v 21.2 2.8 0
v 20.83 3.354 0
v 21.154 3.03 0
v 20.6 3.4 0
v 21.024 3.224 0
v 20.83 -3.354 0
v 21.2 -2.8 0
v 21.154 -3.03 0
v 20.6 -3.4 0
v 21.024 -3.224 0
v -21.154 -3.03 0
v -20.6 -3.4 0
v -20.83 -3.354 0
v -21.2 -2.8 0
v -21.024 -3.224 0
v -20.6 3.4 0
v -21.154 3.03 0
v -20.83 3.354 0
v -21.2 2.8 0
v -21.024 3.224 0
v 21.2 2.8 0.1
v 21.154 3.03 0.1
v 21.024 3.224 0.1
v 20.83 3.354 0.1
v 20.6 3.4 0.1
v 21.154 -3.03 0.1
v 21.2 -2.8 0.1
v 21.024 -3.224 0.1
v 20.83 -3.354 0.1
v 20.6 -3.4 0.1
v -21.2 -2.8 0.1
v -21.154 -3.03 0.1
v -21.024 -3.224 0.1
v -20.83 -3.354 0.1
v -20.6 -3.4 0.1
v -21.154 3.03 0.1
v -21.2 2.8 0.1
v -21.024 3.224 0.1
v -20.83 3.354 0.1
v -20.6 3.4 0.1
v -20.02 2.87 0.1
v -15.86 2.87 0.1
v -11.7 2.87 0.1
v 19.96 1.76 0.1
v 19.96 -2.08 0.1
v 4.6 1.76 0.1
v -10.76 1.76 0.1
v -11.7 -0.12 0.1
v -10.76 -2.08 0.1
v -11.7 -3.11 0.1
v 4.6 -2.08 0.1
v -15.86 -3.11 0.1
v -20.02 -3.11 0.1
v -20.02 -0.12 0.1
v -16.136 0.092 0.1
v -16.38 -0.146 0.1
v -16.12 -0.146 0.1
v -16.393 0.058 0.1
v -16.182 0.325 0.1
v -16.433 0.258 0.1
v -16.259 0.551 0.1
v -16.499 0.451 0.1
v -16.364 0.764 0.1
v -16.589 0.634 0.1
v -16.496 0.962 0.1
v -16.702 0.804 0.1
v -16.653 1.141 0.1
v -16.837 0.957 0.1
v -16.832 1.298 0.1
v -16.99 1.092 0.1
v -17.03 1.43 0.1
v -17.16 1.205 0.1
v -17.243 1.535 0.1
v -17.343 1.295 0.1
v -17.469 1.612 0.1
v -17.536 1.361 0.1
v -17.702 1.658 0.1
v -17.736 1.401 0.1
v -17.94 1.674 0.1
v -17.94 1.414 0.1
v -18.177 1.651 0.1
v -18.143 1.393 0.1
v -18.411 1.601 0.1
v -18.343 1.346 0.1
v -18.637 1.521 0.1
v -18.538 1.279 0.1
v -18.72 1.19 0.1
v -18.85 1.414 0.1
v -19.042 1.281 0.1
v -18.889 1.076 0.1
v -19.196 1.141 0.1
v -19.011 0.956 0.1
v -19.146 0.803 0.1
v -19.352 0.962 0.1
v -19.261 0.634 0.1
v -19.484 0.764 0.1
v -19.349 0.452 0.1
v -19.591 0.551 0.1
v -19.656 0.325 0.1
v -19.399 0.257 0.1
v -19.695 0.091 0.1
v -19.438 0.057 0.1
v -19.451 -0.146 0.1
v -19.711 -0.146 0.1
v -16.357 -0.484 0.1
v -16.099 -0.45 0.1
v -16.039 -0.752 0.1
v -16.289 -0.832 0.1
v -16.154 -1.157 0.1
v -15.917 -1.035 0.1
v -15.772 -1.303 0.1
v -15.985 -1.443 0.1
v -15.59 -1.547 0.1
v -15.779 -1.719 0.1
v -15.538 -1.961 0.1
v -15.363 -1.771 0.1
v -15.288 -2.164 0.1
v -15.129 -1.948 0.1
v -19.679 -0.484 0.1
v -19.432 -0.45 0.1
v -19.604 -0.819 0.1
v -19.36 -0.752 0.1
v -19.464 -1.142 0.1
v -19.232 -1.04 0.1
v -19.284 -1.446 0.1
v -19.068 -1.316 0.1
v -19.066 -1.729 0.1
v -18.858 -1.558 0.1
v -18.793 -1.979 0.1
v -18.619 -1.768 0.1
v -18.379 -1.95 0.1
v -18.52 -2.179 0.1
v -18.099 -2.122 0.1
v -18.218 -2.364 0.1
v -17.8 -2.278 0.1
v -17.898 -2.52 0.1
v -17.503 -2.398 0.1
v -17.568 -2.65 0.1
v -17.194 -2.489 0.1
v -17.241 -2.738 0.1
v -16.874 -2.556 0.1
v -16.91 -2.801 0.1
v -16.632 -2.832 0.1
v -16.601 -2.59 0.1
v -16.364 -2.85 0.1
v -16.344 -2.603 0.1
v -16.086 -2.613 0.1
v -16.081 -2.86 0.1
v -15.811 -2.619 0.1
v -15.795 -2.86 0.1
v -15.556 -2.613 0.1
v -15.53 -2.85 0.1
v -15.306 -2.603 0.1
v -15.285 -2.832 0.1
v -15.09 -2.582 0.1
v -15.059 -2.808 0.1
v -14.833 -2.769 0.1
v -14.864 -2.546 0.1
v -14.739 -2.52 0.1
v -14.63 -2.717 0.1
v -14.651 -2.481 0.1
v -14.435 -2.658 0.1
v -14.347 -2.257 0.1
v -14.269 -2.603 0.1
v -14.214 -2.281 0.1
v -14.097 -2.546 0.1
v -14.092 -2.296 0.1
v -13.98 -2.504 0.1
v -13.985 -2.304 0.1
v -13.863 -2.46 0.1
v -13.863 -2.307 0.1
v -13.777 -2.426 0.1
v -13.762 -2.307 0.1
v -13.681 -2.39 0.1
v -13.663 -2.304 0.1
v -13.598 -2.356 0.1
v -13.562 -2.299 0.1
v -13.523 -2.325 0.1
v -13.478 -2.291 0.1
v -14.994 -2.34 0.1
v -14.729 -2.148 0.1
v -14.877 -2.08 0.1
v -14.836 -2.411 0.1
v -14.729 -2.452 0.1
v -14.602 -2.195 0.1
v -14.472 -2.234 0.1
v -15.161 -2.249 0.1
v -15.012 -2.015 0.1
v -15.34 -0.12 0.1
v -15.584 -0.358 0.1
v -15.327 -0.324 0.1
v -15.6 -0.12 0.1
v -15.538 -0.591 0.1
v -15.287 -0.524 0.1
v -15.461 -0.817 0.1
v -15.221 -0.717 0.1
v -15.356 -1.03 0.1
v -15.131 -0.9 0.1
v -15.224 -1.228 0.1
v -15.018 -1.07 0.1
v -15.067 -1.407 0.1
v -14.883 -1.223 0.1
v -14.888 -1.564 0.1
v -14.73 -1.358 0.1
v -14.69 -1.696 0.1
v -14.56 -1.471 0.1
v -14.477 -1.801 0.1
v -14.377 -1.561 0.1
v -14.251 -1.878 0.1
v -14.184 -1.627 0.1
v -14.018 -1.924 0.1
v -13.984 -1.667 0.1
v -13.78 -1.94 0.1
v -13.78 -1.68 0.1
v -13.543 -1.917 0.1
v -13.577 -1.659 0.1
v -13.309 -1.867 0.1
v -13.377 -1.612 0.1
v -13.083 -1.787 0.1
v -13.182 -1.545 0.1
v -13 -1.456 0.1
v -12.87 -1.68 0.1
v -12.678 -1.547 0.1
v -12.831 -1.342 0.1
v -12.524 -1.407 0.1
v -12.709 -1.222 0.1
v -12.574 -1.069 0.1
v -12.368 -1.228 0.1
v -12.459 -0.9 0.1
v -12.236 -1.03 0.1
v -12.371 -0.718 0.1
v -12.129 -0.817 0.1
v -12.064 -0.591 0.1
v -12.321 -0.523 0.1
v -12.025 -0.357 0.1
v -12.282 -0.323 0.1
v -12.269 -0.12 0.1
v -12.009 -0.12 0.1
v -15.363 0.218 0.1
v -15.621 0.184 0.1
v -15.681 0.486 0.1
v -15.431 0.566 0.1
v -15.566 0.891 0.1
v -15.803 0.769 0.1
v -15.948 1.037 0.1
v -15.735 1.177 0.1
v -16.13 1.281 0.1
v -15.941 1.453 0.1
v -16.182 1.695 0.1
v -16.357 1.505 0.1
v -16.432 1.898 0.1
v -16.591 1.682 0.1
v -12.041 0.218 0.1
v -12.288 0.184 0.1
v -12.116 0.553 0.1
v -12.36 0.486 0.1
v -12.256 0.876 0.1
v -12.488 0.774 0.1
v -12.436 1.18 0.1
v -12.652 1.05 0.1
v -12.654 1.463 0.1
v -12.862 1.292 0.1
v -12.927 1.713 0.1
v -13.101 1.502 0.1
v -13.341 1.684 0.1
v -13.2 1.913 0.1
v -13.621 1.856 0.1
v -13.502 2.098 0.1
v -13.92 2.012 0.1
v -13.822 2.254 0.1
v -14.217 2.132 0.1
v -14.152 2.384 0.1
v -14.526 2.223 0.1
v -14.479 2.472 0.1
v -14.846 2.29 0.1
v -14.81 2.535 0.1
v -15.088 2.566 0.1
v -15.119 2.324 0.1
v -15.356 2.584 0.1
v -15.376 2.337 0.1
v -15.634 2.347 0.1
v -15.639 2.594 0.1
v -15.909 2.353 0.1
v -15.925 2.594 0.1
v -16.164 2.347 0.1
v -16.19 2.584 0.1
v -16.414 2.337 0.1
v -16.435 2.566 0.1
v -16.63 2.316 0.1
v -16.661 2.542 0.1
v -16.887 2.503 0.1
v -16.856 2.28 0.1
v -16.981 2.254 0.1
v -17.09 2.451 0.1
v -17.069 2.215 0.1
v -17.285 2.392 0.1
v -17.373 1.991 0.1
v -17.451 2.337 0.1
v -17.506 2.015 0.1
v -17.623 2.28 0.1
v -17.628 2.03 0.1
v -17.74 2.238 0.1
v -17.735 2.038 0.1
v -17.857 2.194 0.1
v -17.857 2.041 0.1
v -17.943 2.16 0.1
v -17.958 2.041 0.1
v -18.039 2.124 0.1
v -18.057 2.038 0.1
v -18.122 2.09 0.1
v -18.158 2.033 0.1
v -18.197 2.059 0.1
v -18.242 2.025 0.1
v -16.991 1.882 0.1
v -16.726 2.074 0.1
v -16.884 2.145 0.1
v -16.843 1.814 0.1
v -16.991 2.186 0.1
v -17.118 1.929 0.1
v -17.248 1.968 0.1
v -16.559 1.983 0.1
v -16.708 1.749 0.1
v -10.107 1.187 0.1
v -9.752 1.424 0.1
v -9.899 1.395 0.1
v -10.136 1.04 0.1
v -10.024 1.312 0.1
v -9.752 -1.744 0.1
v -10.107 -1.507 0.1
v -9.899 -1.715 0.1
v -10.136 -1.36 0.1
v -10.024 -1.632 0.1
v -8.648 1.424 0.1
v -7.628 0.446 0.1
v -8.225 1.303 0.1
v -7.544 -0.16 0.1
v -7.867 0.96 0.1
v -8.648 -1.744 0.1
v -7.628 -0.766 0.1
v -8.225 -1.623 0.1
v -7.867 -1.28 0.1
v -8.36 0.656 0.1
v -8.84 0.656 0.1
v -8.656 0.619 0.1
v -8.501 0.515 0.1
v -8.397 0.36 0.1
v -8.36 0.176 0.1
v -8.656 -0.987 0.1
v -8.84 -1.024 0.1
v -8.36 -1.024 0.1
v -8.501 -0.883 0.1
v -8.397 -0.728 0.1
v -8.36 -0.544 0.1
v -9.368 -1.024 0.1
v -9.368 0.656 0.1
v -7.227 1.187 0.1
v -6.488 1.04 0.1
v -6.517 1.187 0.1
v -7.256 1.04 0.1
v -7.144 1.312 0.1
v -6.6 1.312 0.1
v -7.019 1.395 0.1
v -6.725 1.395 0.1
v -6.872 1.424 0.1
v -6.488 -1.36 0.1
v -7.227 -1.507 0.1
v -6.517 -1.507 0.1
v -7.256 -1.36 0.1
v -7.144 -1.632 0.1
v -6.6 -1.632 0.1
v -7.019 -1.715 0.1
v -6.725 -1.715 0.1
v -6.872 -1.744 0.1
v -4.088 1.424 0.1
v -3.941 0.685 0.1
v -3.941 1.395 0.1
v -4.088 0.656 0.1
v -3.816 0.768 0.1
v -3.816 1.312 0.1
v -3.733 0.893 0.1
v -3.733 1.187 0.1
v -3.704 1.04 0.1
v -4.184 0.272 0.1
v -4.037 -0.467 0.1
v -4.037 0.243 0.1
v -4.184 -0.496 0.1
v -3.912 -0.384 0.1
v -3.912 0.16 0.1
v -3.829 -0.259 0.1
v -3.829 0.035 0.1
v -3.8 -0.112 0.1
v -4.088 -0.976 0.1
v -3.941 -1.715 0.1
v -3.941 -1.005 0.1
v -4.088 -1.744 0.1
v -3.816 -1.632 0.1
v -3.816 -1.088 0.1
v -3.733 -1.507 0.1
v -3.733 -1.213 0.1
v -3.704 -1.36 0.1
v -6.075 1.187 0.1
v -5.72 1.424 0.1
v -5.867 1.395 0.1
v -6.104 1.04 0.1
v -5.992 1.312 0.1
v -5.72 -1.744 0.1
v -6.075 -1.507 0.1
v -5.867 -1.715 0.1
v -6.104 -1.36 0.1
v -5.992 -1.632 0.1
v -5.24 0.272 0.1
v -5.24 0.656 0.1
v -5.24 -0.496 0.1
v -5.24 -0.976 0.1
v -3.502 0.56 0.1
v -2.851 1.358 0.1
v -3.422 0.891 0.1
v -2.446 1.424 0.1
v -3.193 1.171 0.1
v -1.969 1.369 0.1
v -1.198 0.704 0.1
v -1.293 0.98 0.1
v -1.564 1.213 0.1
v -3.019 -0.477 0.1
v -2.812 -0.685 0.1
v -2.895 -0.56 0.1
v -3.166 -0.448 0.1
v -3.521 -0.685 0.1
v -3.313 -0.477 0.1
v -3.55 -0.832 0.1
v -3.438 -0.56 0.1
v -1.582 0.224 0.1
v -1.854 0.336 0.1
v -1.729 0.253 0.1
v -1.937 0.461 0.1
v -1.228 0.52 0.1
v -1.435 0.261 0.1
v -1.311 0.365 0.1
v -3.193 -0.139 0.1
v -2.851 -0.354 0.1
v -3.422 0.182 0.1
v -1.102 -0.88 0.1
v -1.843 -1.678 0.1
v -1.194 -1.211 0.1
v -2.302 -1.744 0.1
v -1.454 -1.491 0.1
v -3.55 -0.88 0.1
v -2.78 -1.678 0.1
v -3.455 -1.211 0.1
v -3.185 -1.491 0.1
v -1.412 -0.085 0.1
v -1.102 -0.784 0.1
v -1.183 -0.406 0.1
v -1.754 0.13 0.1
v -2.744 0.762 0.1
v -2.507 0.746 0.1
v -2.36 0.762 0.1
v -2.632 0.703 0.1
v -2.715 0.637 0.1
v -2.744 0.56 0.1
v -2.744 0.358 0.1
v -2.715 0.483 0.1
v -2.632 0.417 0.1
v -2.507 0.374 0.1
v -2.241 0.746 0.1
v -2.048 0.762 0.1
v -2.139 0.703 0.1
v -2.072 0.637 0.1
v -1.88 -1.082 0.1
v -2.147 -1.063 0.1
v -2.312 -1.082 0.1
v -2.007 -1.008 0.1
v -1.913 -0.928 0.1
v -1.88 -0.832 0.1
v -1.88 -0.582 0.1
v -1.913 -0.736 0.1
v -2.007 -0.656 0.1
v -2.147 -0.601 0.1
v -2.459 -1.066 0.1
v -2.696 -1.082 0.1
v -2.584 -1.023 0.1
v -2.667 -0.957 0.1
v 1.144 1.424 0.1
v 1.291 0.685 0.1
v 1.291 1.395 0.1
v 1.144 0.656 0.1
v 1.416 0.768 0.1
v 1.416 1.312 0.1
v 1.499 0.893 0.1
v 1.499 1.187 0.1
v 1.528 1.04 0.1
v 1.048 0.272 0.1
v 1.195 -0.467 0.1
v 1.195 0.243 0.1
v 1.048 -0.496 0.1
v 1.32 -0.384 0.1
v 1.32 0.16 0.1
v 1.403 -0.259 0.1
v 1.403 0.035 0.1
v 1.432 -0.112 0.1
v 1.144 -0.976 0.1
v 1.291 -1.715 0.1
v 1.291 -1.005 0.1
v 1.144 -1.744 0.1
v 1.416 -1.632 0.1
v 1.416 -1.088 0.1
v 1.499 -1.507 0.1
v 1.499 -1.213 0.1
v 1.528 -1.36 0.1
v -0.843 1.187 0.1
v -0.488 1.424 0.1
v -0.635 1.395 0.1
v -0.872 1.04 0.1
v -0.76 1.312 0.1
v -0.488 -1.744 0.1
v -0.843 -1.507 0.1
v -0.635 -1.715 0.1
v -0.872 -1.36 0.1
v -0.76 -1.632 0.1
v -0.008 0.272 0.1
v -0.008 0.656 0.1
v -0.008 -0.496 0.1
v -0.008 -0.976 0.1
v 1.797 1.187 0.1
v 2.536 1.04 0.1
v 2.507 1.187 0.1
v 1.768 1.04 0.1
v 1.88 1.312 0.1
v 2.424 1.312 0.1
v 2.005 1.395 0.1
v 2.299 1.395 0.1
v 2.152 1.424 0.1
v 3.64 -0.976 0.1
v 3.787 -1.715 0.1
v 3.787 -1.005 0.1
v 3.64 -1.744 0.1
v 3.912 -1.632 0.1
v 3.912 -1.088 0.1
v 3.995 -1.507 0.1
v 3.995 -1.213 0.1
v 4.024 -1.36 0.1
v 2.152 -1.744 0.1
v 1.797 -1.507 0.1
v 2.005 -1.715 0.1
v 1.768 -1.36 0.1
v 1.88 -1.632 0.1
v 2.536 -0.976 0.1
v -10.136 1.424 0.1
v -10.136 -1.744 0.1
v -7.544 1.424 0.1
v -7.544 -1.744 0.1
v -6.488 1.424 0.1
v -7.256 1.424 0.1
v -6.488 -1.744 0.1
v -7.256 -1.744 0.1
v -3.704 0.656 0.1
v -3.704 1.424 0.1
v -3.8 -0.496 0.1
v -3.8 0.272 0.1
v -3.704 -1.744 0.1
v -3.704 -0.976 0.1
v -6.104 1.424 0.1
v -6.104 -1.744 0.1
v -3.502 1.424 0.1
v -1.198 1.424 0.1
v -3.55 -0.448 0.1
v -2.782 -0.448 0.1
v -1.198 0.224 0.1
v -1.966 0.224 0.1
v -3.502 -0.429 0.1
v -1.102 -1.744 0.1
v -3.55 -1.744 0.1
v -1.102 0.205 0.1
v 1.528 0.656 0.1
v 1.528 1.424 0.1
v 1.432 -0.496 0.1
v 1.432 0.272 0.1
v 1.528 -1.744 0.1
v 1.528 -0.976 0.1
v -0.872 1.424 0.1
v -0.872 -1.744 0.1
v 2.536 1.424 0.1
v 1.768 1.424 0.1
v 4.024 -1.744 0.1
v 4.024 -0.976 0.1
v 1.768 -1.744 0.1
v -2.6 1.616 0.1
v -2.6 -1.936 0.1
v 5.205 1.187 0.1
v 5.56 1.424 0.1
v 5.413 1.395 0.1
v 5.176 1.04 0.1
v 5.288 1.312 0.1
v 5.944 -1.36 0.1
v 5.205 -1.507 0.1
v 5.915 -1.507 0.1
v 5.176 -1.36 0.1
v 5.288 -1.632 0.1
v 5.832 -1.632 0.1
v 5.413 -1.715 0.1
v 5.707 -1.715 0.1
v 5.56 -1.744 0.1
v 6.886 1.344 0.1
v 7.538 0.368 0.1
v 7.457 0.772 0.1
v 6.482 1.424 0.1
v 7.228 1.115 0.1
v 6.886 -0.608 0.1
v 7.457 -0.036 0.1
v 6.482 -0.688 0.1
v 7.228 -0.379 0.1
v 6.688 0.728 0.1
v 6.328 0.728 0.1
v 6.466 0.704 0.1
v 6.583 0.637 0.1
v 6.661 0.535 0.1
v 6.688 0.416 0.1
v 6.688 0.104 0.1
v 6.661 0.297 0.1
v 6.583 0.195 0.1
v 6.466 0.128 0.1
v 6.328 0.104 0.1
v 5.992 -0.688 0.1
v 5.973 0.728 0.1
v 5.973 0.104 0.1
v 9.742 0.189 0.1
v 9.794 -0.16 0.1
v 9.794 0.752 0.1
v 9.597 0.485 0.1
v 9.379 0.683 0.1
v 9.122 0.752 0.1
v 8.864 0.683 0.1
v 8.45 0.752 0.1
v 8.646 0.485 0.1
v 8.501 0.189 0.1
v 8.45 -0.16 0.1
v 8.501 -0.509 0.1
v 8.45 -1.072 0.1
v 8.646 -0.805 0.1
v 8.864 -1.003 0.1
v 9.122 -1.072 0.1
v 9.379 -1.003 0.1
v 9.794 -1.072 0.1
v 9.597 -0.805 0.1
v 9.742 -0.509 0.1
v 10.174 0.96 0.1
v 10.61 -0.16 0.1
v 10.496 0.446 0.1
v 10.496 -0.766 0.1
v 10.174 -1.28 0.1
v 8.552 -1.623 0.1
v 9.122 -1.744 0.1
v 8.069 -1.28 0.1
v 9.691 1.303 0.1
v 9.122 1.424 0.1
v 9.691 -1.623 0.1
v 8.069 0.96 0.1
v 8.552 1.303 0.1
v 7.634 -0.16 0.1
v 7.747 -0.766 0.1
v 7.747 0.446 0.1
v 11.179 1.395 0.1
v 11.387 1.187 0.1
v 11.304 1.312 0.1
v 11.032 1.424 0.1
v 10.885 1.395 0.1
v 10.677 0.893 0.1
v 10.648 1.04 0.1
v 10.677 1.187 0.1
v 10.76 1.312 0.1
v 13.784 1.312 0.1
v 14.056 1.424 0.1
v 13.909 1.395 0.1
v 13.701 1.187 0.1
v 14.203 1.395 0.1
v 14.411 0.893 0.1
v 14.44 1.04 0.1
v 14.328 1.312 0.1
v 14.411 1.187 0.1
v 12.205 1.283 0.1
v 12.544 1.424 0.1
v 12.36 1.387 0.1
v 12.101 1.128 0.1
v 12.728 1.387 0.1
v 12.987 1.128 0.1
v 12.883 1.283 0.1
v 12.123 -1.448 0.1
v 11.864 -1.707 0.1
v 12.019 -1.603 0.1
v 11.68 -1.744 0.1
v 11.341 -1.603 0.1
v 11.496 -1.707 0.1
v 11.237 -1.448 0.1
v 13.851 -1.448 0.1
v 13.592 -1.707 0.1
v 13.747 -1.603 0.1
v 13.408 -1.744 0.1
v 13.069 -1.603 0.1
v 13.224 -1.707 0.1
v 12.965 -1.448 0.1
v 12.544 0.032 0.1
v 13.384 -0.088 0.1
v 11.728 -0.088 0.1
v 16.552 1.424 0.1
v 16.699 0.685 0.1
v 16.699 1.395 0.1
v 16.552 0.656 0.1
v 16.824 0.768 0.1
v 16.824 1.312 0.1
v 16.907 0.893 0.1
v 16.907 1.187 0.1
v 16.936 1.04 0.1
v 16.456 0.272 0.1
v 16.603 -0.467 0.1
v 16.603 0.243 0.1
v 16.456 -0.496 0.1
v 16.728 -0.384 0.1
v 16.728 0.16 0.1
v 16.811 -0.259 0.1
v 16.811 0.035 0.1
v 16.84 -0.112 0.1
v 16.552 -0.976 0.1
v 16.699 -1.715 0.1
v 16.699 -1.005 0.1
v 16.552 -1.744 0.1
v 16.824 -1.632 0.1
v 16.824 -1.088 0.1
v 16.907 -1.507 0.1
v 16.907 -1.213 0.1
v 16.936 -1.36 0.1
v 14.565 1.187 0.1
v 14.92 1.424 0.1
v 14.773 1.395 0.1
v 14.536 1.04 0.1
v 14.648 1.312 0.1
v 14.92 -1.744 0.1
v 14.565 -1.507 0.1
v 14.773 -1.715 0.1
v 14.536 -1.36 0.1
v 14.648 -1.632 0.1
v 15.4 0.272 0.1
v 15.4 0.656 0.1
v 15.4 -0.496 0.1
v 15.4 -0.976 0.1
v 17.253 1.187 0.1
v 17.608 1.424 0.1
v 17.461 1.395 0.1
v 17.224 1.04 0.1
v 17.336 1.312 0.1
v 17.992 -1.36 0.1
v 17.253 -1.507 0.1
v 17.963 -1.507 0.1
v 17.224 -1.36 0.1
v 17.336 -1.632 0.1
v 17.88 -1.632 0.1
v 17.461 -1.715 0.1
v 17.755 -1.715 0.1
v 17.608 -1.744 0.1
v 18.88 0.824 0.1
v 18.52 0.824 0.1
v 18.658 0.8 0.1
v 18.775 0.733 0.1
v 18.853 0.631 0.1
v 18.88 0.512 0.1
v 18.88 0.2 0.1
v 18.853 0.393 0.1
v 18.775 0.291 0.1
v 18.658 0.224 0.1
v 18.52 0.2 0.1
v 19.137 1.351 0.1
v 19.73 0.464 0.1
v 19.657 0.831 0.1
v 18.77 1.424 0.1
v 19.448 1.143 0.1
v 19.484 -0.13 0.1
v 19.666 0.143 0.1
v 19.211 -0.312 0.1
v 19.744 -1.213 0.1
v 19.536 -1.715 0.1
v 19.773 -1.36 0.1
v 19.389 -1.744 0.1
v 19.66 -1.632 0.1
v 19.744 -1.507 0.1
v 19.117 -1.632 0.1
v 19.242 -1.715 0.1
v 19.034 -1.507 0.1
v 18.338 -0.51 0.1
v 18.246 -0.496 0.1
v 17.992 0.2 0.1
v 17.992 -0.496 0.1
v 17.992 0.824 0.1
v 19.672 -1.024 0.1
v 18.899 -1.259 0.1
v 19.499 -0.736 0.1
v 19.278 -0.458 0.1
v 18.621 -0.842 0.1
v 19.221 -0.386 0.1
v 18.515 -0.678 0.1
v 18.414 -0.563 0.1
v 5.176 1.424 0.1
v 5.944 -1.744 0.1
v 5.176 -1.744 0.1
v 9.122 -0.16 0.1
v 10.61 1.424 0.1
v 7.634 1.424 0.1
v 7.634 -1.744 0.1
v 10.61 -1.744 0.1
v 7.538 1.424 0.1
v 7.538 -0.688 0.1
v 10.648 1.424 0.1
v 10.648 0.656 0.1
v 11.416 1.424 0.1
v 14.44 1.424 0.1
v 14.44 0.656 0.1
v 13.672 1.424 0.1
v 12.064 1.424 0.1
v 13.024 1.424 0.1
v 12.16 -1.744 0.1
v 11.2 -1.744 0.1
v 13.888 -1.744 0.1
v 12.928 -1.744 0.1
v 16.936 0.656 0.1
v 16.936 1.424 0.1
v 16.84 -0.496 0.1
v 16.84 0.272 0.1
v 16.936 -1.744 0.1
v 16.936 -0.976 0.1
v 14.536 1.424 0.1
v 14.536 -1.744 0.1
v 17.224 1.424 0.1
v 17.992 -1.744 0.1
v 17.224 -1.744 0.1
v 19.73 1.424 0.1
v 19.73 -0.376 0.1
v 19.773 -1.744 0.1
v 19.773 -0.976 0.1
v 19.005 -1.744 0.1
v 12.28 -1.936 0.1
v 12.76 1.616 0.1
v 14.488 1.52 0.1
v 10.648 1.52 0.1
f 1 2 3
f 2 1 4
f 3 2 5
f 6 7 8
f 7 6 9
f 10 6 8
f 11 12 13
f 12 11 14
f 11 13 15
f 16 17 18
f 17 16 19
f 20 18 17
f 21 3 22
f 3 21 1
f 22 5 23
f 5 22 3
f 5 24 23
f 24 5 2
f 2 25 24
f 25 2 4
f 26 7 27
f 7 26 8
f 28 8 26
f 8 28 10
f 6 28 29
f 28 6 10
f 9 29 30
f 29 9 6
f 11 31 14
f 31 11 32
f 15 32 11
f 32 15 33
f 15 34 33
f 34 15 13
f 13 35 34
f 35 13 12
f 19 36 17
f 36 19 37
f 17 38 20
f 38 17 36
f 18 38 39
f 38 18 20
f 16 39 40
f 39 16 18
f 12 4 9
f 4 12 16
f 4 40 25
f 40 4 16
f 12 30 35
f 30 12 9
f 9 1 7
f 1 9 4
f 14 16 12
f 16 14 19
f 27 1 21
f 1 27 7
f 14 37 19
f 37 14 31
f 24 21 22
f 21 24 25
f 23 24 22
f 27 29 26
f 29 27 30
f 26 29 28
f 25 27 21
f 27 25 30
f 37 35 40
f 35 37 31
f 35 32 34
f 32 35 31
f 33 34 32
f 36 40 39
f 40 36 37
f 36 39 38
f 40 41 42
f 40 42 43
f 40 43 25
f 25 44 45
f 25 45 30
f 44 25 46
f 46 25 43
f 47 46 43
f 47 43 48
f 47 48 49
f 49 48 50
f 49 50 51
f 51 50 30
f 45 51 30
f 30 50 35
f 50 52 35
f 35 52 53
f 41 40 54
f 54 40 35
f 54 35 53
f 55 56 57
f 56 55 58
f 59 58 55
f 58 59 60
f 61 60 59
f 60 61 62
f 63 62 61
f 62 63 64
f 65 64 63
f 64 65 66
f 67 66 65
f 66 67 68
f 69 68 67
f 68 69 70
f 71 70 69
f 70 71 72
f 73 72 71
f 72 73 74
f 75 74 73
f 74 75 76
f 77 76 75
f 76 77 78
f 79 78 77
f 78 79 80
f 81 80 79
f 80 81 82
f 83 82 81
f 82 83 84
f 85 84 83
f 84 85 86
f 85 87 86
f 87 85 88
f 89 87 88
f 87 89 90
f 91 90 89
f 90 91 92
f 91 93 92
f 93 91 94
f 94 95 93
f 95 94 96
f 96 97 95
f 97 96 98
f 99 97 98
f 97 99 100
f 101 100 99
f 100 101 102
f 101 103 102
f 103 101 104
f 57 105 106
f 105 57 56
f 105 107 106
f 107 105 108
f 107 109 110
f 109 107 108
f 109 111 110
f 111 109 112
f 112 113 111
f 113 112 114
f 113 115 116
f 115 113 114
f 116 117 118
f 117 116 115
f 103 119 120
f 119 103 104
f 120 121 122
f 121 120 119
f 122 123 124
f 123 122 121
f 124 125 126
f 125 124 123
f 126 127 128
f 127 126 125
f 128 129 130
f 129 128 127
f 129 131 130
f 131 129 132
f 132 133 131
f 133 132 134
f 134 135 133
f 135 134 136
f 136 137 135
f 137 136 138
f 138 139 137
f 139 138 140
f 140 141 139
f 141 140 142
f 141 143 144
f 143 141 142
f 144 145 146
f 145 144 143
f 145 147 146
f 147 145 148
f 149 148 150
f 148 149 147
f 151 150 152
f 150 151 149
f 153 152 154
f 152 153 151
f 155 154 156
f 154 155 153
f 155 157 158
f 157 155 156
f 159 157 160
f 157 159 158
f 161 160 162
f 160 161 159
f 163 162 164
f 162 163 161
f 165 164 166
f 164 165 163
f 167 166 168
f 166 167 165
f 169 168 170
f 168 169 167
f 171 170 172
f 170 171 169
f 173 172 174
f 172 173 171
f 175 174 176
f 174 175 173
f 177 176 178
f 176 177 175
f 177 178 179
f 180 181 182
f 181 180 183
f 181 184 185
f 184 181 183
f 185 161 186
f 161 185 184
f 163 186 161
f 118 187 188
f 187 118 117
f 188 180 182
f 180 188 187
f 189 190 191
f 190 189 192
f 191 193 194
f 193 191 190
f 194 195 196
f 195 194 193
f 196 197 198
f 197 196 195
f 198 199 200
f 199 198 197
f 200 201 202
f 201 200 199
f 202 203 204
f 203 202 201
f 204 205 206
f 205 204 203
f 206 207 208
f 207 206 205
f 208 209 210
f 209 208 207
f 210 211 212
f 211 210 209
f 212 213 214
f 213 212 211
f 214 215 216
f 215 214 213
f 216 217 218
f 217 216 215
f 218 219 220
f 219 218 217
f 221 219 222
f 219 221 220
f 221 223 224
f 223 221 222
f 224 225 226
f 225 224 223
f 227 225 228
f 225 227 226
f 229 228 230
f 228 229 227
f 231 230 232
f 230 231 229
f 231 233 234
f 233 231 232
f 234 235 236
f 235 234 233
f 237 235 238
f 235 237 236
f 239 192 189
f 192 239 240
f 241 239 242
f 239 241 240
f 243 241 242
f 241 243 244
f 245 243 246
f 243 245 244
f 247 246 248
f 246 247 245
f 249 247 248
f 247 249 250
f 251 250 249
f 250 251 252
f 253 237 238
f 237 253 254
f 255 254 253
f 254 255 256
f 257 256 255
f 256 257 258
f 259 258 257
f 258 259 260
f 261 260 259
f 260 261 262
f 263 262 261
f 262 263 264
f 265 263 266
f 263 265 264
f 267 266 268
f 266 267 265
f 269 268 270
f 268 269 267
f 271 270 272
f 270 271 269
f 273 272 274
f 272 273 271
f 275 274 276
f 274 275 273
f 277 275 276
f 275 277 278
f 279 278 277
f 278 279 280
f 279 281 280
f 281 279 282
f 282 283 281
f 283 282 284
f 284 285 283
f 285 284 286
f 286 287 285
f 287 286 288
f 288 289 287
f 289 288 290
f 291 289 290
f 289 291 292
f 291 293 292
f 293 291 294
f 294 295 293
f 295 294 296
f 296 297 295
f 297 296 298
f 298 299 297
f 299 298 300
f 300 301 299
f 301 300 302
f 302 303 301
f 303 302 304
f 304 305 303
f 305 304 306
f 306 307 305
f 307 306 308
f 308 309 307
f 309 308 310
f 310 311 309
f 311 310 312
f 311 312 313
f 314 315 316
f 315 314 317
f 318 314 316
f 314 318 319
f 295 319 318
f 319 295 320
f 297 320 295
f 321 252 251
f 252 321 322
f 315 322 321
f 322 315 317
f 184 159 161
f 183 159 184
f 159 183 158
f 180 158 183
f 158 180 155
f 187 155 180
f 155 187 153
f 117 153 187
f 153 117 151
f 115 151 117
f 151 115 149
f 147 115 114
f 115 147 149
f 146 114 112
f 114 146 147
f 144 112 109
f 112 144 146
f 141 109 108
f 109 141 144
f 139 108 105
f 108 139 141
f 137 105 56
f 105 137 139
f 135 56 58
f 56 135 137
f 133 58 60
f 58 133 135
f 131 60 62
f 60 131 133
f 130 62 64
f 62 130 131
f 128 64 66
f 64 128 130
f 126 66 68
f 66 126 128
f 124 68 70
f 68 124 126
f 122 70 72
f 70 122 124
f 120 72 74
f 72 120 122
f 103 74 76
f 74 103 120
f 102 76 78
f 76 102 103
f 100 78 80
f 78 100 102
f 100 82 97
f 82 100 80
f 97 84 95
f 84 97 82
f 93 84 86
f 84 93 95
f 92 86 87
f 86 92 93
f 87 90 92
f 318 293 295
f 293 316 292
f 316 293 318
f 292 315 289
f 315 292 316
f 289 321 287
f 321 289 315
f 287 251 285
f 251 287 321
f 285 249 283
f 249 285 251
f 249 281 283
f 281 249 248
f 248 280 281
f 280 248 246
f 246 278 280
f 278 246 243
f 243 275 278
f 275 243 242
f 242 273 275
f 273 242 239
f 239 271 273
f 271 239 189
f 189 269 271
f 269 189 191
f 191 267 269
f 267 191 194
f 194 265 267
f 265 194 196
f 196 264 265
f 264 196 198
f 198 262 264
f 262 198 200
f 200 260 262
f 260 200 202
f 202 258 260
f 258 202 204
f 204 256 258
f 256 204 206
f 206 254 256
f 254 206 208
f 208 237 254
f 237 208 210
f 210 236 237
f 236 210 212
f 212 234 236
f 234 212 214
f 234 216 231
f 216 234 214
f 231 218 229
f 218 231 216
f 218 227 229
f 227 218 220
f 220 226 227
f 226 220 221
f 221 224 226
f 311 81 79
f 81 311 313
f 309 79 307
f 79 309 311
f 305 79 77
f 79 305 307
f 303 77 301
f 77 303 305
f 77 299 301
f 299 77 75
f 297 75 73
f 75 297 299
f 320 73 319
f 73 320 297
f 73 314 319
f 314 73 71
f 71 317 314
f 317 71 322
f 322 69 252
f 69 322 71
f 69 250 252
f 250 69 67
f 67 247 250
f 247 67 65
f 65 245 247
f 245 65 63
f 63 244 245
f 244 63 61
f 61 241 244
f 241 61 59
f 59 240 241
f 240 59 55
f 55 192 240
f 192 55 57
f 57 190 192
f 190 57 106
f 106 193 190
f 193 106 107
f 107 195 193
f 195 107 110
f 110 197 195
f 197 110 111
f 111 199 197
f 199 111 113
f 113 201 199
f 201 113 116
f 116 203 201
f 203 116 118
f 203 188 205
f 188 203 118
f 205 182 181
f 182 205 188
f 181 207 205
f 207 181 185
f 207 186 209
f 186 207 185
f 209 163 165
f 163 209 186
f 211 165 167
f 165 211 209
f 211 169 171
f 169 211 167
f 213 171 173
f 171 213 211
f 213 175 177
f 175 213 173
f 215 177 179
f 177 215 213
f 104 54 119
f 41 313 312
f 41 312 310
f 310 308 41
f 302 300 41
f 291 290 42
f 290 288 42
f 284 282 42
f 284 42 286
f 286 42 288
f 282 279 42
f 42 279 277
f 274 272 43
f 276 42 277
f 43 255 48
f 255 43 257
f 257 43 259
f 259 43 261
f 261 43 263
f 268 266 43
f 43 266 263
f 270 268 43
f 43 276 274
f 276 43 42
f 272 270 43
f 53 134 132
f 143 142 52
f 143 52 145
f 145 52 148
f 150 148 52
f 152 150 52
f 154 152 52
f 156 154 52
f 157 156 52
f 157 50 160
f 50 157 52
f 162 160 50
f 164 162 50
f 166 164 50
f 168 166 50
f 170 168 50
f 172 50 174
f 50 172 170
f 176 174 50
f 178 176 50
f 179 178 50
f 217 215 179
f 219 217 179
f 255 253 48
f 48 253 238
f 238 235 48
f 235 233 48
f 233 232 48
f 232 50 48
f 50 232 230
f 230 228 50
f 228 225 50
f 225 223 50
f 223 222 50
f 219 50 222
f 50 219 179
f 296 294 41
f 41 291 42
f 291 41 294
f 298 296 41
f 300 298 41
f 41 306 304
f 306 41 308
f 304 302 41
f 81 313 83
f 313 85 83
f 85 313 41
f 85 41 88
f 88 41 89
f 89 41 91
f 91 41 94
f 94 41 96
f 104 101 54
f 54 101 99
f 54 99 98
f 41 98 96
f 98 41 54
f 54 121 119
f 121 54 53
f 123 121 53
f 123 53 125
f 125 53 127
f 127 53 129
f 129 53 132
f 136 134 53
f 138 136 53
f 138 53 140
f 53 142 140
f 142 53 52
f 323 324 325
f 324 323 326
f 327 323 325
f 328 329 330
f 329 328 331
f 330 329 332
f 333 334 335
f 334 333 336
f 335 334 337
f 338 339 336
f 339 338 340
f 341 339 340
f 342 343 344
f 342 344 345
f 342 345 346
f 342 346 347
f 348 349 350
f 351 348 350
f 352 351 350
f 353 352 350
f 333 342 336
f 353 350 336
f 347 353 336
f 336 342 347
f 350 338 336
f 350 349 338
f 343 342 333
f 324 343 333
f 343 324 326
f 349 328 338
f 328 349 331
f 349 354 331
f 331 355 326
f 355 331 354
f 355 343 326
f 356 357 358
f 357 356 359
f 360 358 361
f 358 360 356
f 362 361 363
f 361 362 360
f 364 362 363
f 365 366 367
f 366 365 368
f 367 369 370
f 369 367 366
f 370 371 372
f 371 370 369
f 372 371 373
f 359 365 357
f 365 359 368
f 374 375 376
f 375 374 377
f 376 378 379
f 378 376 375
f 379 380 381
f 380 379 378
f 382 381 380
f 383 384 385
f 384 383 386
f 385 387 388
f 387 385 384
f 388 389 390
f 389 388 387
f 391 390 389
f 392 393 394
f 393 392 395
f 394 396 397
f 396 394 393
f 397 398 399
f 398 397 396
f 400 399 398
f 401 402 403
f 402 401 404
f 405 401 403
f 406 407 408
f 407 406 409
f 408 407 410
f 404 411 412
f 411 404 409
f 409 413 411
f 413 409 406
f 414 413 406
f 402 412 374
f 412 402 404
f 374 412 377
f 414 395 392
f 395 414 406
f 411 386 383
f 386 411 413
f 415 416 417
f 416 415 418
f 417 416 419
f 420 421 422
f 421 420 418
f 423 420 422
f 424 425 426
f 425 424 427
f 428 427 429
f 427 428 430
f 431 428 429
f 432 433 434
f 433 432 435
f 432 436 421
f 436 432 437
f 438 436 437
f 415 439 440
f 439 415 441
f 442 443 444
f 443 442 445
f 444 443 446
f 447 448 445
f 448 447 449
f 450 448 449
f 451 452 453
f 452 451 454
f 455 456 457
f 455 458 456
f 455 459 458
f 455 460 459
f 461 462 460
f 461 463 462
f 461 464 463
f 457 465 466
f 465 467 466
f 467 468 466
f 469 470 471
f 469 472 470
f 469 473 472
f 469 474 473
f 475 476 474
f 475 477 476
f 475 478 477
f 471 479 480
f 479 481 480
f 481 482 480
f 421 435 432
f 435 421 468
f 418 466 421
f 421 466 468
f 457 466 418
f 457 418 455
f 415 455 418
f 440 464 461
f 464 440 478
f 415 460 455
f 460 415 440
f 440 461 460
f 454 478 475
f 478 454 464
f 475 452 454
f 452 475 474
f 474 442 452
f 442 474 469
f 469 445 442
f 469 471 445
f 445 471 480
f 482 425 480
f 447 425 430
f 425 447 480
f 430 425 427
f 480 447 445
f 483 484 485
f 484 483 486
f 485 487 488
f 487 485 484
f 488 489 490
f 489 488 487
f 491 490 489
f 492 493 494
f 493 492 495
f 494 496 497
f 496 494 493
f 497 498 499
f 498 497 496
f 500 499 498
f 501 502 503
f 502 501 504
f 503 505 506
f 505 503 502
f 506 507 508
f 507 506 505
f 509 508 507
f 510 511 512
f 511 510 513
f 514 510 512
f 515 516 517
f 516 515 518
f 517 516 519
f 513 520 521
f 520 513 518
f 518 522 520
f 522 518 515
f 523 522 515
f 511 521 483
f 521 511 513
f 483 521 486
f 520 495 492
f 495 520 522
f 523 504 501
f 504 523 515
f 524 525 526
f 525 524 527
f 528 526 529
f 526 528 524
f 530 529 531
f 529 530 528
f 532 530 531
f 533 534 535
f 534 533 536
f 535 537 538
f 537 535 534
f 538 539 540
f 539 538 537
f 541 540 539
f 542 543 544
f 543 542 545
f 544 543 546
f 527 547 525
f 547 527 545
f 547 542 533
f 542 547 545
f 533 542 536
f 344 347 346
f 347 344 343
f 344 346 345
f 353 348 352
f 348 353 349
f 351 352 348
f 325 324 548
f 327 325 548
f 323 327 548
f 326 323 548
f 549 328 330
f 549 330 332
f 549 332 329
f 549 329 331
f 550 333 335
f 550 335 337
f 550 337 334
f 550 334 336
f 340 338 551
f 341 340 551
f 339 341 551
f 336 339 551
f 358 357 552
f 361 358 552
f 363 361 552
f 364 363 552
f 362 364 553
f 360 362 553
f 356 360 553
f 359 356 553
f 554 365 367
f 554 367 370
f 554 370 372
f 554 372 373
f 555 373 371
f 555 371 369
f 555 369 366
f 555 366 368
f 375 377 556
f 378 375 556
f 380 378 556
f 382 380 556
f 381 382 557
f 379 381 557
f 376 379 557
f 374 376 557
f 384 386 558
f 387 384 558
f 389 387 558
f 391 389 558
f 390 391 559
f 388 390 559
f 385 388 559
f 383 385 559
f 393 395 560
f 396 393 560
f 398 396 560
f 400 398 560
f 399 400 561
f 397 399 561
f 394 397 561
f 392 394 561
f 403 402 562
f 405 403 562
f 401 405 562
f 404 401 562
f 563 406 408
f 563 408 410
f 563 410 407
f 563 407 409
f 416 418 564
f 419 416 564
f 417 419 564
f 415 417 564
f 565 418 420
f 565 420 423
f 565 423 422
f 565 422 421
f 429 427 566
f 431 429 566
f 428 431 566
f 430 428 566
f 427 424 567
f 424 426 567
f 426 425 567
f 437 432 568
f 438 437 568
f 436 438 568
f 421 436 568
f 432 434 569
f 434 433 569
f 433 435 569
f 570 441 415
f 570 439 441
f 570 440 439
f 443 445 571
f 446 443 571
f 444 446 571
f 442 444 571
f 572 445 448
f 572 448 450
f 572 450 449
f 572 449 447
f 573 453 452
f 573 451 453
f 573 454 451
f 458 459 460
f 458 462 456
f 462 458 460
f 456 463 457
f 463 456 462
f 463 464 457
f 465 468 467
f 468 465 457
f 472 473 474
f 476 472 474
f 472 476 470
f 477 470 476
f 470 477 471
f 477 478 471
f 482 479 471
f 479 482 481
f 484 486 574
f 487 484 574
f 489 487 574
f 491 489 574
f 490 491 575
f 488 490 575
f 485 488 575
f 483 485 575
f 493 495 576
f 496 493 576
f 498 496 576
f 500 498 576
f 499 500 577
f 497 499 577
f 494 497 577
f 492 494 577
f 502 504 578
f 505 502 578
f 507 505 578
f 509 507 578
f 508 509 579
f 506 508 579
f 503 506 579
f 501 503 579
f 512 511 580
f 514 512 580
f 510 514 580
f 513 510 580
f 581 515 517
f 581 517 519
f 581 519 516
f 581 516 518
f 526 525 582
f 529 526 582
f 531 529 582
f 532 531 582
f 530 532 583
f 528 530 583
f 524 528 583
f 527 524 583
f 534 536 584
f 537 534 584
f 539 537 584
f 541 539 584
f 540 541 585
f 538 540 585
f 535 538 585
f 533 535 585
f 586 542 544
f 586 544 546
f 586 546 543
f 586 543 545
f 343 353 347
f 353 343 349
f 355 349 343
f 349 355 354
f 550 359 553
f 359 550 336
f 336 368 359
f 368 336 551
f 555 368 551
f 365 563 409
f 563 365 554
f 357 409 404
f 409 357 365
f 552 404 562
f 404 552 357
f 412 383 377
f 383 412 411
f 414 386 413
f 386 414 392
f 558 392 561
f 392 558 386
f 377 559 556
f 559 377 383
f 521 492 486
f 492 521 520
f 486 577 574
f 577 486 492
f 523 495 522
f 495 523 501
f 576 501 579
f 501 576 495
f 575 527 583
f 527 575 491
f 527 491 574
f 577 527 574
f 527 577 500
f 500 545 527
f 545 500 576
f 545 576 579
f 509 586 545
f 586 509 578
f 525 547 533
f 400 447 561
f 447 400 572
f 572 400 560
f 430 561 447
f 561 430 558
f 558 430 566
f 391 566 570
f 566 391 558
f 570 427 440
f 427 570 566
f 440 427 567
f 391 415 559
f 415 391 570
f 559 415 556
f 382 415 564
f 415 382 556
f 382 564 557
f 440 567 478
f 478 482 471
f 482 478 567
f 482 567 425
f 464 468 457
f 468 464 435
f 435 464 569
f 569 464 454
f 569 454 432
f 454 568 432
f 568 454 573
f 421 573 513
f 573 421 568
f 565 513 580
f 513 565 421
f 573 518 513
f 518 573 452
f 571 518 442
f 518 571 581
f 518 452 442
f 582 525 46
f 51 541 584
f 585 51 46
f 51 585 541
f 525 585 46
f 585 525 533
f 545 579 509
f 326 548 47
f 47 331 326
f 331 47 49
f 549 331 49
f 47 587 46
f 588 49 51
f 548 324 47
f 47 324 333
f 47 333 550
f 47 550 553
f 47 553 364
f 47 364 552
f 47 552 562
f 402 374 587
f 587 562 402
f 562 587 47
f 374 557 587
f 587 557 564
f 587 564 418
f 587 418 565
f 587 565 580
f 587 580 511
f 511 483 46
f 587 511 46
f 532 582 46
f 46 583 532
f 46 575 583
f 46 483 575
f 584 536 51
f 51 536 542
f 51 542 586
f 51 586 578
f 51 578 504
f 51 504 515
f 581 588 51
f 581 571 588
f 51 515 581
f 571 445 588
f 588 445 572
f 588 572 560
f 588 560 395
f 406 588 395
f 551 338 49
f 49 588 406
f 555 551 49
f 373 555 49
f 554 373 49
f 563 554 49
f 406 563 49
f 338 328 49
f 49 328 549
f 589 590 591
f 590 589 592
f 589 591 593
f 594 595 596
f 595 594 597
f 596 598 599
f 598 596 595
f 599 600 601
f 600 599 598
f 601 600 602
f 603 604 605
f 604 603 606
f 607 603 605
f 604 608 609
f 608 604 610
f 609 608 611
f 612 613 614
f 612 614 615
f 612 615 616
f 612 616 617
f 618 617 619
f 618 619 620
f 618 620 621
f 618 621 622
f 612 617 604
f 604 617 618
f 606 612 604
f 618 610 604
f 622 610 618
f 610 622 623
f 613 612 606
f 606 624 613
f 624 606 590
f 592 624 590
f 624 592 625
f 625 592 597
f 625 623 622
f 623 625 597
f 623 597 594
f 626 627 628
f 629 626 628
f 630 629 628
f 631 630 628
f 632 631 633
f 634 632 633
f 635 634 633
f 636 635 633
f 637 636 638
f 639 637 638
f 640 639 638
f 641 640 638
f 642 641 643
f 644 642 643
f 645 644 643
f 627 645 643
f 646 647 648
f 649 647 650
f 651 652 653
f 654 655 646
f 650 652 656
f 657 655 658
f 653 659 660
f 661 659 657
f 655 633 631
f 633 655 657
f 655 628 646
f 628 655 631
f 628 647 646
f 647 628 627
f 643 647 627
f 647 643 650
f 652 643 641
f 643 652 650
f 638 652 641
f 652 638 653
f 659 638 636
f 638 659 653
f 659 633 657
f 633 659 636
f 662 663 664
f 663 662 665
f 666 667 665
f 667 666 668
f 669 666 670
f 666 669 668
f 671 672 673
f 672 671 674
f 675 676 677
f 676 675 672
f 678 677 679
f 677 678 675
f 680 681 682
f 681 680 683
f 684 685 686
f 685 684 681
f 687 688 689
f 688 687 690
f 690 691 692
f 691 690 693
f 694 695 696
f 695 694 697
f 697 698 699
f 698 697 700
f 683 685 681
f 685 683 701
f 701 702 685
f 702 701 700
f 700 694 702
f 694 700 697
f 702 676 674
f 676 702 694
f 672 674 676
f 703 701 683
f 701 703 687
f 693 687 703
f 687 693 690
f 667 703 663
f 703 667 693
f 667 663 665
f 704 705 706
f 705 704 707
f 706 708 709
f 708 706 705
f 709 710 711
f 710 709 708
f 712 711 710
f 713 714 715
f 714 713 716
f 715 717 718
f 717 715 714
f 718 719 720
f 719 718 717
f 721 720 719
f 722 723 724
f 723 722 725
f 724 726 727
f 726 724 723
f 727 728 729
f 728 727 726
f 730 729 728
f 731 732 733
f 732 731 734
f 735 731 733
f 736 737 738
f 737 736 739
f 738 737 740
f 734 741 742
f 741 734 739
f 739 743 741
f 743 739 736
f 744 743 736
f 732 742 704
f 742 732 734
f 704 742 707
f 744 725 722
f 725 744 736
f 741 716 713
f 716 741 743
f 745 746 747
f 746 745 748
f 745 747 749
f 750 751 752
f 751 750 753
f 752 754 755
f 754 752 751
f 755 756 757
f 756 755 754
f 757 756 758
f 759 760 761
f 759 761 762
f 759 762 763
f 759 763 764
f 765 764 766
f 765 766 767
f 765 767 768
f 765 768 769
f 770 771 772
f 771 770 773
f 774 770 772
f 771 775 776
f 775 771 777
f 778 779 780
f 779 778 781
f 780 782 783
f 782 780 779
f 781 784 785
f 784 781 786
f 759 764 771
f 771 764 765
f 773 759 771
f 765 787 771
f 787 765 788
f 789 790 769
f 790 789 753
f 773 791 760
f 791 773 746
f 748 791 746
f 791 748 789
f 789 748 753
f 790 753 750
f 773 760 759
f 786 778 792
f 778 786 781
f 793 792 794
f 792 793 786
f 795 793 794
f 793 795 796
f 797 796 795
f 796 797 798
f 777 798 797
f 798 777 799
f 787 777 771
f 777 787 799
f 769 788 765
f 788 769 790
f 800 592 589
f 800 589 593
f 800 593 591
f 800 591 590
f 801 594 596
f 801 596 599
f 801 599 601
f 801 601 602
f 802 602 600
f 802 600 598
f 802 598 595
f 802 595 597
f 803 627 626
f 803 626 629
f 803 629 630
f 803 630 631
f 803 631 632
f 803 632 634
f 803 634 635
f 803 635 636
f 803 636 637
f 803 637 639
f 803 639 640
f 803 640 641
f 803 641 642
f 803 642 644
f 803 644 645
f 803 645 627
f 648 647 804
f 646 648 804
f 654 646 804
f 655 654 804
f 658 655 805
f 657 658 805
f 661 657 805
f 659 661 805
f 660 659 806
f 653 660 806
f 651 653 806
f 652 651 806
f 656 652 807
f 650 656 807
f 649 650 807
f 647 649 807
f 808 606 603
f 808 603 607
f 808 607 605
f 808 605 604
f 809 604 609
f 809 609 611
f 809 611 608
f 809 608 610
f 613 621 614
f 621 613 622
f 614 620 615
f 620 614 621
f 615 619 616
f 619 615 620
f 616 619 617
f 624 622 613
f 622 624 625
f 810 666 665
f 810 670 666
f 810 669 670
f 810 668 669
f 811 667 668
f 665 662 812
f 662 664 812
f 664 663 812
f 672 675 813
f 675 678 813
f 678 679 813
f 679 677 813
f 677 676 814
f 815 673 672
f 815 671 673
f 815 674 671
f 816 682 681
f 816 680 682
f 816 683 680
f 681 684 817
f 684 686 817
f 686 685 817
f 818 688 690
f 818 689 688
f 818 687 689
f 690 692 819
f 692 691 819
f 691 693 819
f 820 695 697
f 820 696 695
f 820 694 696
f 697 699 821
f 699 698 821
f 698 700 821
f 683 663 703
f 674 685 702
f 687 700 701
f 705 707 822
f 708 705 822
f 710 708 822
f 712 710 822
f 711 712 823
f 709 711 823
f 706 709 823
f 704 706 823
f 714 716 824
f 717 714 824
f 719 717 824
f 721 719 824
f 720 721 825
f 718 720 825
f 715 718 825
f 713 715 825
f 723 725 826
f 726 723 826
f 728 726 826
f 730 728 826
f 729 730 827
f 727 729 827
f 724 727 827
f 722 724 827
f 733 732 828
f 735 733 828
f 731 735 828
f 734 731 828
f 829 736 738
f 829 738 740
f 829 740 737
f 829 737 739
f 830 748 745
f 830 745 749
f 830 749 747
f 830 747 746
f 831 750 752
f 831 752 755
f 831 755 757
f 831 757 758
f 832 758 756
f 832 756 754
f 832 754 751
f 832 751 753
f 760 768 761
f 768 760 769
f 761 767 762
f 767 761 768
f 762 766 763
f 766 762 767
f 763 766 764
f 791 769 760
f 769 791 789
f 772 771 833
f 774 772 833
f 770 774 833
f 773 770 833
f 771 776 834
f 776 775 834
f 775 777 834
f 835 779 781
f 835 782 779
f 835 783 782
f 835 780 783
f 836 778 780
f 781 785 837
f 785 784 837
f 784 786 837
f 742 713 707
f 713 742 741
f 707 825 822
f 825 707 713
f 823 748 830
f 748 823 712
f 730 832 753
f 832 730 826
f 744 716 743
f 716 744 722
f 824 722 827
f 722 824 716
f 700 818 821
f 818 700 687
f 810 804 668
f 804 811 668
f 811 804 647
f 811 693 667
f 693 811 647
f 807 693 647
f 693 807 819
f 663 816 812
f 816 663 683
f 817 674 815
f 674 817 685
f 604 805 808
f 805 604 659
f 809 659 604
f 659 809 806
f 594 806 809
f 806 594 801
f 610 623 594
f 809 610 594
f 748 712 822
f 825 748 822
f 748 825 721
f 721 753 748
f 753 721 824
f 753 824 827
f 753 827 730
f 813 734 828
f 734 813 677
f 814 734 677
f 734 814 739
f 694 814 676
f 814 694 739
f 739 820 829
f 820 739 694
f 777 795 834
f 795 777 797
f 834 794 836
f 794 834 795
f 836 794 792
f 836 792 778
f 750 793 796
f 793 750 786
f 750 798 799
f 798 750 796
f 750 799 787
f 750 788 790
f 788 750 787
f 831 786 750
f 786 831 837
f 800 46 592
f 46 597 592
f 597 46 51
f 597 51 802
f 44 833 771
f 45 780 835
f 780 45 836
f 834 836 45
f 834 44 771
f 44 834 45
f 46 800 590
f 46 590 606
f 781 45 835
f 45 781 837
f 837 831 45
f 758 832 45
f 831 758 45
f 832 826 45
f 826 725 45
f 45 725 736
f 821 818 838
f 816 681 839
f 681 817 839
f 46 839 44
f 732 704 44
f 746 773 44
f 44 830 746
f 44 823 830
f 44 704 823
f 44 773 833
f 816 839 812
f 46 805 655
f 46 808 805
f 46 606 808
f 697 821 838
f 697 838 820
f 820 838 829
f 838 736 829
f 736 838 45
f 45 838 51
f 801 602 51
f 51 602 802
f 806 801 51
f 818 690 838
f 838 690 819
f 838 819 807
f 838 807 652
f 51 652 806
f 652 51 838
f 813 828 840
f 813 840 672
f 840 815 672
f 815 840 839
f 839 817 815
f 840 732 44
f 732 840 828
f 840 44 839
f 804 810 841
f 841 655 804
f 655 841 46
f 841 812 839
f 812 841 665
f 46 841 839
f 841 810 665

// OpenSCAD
use <../lib.scad>
use <../p/logo-octan.scad>
use <s/4121723ds01.scad>
use <s/4121723s05.scad>
use <s/4121723s06.scad>
use <s/4121723s07.scad>
use <s/4121723s08.scad>
function ldraw_lib__4121723d() = [
// 0 Sticker  0.95 x  5.3 with Octan Logo and Red "DIESEL POWER" - Right Aligned
// 0 Name: 4121723d.dat
// 0 Author: Ulrich Röder [UR]
// 0 !LDRAW_ORG Part UPDATE 2022-01
// 0 !LICENSE Licensed under CC BY 4.0 : see CAreadme.txt
// 
// 0 BFC CERTIFY CCW
  [0,"BFC","CERTIFY"],
  [0,"BFC","CCW"],
// 
// 0 !KEYWORDS Model Team, Racing Truck, Set 5563
// 
// 0 !HISTORY 2022-01-14 [PTadmin] Official Update 2022-01
// 
// 
// 1 16 0 0 0 1 0 0 0 1 0 0 0 1 s\4121723ds01.dat
  [1,16,0,0,0,1,0,0,0,1,0,0,0,1, ldraw_lib__s__4121723ds01()],
// 1 16 -39.65 -.25 -.3 .65 0 0 0 1 0 0 0 .65 logo-octan.dat
  [1,16,-39.65,-.25,-.3,.65,0,0,0,1,0,0,0,.65, ldraw_lib__logo_octan()],
// 1 4 -7.7 -.25 -.4 1.2 0 0 0 1 0 0 0 1.2 s\4121723s05.dat
  [1,4,-7.7,-.25,-.4,1.2,0,0,0,1,0,0,0,1.2, ldraw_lib__s__4121723s05()],
// 1 16 -7.7 -.25 -.4 1.2 0 0 0 1 0 0 0 1.2 s\4121723s07.dat
  [1,16,-7.7,-.25,-.4,1.2,0,0,0,1,0,0,0,1.2, ldraw_lib__s__4121723s07()],
// 1 4 30.7 -.25 -.4 1.2 0 0 0 1 0 0 0 1.2 s\4121723s06.dat
  [1,4,30.7,-.25,-.4,1.2,0,0,0,1,0,0,0,1.2, ldraw_lib__s__4121723s06()],
// 1 16 30.7 -.25 -.4 1.2 0 0 0 1 0 0 0 1.2 s\4121723s08.dat
  [1,16,30.7,-.25,-.4,1.2,0,0,0,1,0,0,0,1.2, ldraw_lib__s__4121723s08()],
];
module ldraw_lib__4121723d(step=0, col=false, unit=2/5, alt=false, line=0.2, solid=!$preview)
    makepoly(ldraw_lib__4121723d(), step=step, col=col, unit=unit, alt=alt, line=line, solid=solid);
ldraw_lib__4121723d(line=0.2);
